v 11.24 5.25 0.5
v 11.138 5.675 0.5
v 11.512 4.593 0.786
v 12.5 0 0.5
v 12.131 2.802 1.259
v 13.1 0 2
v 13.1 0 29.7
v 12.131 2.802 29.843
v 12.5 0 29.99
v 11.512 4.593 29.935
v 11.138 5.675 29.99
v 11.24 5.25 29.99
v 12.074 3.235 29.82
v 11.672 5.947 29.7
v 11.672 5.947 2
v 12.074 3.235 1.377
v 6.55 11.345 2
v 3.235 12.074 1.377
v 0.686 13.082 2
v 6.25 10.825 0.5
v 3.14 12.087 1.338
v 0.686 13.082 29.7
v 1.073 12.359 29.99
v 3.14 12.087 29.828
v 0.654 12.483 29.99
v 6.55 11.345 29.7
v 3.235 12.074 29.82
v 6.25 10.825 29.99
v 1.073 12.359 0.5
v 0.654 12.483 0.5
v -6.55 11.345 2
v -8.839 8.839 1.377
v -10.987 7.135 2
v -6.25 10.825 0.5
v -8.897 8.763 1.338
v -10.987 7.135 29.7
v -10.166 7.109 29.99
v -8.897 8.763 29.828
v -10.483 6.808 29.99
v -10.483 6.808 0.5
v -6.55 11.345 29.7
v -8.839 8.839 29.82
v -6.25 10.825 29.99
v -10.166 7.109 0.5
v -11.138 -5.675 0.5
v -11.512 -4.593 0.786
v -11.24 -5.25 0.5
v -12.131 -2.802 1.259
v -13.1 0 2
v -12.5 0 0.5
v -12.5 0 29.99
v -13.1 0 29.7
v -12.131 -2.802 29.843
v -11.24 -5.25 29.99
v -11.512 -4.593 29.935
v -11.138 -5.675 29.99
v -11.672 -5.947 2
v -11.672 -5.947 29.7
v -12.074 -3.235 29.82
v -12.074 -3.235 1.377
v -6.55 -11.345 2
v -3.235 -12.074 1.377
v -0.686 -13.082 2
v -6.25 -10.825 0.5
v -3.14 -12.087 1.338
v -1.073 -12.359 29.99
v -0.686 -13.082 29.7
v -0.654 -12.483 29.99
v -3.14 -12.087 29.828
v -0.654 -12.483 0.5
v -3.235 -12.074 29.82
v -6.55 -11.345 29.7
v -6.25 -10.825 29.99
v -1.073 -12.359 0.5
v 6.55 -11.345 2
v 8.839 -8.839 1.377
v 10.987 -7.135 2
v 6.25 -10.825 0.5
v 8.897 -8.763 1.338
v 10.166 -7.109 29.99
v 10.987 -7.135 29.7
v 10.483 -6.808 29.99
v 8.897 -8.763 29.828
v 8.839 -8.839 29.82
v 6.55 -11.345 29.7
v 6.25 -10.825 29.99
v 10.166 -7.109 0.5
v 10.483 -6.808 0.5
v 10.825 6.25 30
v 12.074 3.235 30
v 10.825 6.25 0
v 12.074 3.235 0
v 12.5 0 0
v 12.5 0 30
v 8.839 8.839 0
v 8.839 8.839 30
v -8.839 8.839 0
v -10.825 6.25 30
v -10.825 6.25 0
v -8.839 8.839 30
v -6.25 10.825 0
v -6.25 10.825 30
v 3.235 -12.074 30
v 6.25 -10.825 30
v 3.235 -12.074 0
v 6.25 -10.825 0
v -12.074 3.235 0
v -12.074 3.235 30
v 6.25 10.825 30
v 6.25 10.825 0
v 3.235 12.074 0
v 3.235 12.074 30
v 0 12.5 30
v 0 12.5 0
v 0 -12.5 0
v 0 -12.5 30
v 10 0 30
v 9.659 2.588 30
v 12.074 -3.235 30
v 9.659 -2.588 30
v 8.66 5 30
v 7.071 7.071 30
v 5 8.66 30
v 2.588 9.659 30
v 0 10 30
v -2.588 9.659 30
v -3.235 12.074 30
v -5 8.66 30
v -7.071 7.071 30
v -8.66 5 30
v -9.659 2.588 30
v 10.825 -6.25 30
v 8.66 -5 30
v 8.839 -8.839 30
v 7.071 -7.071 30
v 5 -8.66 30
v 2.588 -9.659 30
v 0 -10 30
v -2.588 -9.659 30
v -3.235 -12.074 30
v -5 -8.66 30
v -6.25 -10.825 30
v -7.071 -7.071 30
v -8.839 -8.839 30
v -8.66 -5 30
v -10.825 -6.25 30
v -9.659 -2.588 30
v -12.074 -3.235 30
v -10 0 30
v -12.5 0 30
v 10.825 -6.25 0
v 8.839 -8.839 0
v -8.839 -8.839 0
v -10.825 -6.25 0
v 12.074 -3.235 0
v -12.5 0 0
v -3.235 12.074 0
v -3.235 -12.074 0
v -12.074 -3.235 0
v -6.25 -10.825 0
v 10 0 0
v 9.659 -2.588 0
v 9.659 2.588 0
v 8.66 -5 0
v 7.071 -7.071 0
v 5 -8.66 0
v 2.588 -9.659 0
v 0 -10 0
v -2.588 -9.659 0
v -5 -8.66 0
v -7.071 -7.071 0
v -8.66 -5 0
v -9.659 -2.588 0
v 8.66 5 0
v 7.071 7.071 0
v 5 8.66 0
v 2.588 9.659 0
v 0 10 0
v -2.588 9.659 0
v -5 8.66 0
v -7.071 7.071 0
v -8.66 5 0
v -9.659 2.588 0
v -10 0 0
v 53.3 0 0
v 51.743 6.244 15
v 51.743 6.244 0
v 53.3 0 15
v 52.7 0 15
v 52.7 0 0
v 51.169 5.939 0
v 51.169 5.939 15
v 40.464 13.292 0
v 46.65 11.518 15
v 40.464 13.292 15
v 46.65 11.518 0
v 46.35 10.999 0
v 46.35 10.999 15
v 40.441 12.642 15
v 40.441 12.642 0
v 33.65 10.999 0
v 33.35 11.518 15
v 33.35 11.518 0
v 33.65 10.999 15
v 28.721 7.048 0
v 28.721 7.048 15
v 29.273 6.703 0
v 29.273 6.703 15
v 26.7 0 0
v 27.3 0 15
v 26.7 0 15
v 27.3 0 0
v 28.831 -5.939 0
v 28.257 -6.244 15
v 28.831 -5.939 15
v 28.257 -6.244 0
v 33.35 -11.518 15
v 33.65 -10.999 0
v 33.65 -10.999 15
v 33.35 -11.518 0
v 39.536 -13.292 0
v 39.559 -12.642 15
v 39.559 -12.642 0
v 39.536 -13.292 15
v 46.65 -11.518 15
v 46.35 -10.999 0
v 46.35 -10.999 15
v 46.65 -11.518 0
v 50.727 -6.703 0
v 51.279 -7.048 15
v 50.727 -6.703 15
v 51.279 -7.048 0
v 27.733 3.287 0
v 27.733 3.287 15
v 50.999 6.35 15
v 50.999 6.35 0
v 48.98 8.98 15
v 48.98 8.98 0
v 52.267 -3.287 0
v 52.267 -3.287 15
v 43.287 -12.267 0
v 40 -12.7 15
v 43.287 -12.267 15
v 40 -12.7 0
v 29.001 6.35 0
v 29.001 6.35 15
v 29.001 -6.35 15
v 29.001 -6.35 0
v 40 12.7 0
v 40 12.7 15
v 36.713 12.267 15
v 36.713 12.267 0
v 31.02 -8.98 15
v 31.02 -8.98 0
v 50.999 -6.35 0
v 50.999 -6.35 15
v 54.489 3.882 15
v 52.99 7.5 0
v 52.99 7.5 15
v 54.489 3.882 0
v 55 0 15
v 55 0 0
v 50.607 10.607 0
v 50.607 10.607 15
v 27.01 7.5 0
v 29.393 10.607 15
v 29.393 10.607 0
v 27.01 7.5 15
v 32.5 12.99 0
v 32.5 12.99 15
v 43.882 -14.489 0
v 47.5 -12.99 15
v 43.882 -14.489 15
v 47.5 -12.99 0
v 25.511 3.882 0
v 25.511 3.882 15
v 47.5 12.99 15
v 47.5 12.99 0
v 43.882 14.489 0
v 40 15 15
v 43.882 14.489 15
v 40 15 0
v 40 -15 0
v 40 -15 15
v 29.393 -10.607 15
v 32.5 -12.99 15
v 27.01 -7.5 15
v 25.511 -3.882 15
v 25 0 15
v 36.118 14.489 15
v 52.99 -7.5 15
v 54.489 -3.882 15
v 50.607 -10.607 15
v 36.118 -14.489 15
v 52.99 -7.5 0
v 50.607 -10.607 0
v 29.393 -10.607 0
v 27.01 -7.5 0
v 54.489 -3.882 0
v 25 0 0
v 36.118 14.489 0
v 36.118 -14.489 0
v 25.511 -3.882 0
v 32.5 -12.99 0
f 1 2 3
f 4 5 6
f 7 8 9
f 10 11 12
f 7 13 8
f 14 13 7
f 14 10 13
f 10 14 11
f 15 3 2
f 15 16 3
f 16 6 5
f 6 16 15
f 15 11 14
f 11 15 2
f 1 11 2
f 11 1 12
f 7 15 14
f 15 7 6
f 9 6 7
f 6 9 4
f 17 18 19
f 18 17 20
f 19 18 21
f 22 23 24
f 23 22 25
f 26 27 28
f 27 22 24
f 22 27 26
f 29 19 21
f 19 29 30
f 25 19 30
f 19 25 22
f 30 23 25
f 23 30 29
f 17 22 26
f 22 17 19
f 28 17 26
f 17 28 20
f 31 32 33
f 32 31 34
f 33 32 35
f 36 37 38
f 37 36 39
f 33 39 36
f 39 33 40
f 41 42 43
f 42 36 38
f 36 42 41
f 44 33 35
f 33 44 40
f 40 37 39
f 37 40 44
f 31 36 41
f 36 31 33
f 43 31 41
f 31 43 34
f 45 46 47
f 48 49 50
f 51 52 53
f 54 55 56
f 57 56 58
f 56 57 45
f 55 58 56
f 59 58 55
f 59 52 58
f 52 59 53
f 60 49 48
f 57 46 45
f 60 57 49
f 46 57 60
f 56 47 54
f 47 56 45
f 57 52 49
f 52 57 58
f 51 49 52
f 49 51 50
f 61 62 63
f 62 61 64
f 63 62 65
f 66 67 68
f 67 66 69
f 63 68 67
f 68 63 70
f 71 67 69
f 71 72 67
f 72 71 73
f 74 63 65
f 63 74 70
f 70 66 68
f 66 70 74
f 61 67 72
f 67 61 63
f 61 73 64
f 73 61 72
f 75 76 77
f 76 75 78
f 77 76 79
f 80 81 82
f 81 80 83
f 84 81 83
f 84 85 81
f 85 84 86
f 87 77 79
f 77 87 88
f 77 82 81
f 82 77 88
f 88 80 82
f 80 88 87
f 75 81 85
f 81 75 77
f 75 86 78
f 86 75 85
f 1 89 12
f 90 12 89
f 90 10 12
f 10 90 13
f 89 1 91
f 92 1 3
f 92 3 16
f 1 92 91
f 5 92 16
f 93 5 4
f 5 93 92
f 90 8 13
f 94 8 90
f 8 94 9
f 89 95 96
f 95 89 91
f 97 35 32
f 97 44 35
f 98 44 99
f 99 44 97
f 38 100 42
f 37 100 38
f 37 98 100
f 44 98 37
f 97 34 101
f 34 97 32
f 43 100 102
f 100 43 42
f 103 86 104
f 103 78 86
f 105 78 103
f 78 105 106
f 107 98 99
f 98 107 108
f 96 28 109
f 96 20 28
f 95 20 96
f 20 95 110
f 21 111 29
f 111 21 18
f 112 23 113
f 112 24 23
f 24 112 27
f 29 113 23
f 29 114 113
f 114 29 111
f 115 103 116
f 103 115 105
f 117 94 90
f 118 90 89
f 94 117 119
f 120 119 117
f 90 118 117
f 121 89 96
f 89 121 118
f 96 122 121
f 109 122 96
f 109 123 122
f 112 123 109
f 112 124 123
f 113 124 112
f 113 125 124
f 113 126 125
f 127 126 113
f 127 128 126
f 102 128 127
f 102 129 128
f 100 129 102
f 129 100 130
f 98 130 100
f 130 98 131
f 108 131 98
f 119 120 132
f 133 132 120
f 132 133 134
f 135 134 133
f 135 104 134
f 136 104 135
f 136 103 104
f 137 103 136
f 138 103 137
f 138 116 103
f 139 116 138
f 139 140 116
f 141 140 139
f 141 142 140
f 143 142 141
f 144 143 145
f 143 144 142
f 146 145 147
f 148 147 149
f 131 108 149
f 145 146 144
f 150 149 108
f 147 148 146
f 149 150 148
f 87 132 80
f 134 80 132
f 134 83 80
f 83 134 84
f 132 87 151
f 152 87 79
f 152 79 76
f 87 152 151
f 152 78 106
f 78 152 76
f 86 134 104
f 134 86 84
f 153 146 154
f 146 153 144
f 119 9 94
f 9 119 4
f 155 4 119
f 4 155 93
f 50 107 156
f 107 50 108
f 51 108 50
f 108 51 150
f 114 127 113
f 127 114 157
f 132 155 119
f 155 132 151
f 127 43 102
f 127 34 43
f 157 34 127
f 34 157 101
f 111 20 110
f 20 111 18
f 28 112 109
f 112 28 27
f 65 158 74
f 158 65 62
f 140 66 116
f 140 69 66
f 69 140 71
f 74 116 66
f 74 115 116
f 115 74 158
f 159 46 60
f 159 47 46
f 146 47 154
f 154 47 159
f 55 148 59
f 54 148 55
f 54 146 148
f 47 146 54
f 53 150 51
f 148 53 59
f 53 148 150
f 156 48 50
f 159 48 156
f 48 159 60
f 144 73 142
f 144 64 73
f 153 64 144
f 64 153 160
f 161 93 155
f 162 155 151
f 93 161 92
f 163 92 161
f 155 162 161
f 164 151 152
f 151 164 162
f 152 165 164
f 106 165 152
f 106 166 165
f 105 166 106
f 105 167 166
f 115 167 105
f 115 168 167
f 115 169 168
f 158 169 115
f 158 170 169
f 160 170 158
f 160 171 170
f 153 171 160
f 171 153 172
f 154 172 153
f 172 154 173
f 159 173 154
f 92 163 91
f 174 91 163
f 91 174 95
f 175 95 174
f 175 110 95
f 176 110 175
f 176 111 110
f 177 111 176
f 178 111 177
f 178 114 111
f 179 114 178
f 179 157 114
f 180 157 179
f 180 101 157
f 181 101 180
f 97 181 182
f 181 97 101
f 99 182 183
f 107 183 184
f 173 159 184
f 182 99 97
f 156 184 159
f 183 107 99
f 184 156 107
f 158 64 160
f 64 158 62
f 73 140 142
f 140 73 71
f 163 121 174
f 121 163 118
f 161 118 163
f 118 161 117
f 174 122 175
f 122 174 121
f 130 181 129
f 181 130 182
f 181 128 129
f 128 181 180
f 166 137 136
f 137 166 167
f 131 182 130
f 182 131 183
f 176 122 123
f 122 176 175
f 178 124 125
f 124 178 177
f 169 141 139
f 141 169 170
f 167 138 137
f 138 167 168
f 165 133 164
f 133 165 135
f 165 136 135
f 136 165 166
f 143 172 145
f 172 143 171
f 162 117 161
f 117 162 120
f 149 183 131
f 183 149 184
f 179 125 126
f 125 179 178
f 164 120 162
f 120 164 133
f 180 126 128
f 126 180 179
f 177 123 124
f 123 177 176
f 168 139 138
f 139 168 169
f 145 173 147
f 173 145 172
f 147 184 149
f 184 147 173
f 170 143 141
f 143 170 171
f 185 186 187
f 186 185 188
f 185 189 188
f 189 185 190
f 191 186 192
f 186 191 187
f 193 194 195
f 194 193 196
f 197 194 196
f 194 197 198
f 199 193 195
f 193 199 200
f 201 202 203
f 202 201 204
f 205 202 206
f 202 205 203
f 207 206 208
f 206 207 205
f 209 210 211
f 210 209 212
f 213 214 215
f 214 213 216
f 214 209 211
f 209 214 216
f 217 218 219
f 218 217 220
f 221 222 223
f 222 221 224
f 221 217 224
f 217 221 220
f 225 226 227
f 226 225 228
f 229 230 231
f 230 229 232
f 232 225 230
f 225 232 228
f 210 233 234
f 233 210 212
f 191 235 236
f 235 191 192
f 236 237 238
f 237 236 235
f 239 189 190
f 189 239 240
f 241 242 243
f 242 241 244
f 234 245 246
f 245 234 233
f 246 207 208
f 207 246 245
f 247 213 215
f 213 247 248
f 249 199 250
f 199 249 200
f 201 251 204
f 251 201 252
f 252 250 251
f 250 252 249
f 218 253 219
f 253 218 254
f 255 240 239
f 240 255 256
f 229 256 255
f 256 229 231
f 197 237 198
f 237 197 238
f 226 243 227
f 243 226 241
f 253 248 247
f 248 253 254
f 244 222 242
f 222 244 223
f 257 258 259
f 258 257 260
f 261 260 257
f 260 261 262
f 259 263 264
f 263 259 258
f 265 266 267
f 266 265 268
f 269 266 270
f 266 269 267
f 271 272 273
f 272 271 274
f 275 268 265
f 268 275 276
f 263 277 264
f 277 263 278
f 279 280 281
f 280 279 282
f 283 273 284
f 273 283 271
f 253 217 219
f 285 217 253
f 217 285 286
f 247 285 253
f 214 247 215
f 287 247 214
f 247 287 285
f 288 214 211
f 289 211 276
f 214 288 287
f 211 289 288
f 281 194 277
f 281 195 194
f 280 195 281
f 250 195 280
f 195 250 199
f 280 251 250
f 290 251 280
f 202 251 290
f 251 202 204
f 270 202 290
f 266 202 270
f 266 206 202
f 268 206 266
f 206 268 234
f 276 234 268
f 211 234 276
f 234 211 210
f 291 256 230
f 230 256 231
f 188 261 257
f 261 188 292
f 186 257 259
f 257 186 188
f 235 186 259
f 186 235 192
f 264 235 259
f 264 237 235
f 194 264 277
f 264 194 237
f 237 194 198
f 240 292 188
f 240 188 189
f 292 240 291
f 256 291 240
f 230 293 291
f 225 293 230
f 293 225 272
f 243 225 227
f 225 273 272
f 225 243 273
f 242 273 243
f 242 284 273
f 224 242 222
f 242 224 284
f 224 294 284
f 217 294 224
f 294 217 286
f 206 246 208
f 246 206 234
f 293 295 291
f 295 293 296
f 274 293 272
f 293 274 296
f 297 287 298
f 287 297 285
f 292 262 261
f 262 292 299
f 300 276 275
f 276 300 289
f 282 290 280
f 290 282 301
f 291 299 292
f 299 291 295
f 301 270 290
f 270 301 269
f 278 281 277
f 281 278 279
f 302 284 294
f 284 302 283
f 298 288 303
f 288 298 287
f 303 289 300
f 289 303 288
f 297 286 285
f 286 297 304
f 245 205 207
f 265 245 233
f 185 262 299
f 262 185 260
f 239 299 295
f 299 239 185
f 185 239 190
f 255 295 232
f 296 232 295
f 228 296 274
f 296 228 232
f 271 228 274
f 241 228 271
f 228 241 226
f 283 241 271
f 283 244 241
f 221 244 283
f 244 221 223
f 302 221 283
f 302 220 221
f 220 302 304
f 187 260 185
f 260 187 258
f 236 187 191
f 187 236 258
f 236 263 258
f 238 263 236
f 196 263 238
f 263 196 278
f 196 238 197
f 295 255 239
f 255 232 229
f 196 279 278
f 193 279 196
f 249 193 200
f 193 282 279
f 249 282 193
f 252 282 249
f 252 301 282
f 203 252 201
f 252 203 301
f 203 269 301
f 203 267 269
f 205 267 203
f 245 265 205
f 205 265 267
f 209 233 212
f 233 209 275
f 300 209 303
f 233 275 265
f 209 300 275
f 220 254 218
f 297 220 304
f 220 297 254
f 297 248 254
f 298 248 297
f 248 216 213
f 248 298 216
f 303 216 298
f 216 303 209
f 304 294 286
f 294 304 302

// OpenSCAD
// ============================================================
// SPLINES — Splined shaft tube + splined bore
// ============================================================

include <../params.scad>

// --- Splined shaft tube ---
module splined_tube(od, id, h, n_splines=SPLINE_COUNT, depth=SPLINE_DEPTH, duty=SPLINE_DUTY) {
    ridge_ang = 360 / n_splines * duty;
    pilot = min(SPLINE_PILOT, h * 0.1);
    leadin = min(SPLINE_LEADIN, h * 0.25);
    chamfer_top = min(SPLINE_CHAMFER_TOP, h * 0.1);
    z_ridge_start = pilot;
    z_full_start = pilot + leadin;
    z_full_end = h - chamfer_top;

    difference() {
        union() {
            cylinder(d=od, h=h);
            for (i = [0:n_splines-1])
                rotate([0, 0, i * 360 / n_splines])
                rotate_extrude(angle=ridge_ang)
                translate([od/2, 0])
                polygon([
                    [0,     z_ridge_start],
                    [depth, z_full_start],
                    [depth, z_full_end],
                    [0,     h - 0.01],
                ]);
        }
        translate([0, 0, -0.1])
        cylinder(d=id, h=h + 0.2);
    }
}

// --- Splined bore ---
module splined_bore(bore_d, h, n_splines=SPLINE_COUNT, depth=SPLINE_DEPTH, duty=SPLINE_DUTY, clearance=SPLINE_CLEARANCE) {
    ridge_ang = 360 / n_splines * duty;
    translate([0, 0, -0.1])
    cylinder(d=bore_d + clearance * 2, h=h + 0.2);
    for (i = [0:n_splines-1])
        rotate([0, 0, i * 360 / n_splines])
        rotate_extrude(angle=ridge_ang + 1)
        translate([bore_d/2 - 0.1, -0.1])
        square([depth + clearance + 0.1, h + 0.2]);
}

// ============================================================
// STANDALONE PREVIEW ($fn=24 for fast render)
// ============================================================
$fn = 24;

color("SteelBlue")
splined_tube(od=25, id=20, h=30);

translate([40, 0, 0])
color("Tomato")
difference() {
    cylinder(d=30, h=15);
    splined_bore(bore_d=25, h=15);
}
